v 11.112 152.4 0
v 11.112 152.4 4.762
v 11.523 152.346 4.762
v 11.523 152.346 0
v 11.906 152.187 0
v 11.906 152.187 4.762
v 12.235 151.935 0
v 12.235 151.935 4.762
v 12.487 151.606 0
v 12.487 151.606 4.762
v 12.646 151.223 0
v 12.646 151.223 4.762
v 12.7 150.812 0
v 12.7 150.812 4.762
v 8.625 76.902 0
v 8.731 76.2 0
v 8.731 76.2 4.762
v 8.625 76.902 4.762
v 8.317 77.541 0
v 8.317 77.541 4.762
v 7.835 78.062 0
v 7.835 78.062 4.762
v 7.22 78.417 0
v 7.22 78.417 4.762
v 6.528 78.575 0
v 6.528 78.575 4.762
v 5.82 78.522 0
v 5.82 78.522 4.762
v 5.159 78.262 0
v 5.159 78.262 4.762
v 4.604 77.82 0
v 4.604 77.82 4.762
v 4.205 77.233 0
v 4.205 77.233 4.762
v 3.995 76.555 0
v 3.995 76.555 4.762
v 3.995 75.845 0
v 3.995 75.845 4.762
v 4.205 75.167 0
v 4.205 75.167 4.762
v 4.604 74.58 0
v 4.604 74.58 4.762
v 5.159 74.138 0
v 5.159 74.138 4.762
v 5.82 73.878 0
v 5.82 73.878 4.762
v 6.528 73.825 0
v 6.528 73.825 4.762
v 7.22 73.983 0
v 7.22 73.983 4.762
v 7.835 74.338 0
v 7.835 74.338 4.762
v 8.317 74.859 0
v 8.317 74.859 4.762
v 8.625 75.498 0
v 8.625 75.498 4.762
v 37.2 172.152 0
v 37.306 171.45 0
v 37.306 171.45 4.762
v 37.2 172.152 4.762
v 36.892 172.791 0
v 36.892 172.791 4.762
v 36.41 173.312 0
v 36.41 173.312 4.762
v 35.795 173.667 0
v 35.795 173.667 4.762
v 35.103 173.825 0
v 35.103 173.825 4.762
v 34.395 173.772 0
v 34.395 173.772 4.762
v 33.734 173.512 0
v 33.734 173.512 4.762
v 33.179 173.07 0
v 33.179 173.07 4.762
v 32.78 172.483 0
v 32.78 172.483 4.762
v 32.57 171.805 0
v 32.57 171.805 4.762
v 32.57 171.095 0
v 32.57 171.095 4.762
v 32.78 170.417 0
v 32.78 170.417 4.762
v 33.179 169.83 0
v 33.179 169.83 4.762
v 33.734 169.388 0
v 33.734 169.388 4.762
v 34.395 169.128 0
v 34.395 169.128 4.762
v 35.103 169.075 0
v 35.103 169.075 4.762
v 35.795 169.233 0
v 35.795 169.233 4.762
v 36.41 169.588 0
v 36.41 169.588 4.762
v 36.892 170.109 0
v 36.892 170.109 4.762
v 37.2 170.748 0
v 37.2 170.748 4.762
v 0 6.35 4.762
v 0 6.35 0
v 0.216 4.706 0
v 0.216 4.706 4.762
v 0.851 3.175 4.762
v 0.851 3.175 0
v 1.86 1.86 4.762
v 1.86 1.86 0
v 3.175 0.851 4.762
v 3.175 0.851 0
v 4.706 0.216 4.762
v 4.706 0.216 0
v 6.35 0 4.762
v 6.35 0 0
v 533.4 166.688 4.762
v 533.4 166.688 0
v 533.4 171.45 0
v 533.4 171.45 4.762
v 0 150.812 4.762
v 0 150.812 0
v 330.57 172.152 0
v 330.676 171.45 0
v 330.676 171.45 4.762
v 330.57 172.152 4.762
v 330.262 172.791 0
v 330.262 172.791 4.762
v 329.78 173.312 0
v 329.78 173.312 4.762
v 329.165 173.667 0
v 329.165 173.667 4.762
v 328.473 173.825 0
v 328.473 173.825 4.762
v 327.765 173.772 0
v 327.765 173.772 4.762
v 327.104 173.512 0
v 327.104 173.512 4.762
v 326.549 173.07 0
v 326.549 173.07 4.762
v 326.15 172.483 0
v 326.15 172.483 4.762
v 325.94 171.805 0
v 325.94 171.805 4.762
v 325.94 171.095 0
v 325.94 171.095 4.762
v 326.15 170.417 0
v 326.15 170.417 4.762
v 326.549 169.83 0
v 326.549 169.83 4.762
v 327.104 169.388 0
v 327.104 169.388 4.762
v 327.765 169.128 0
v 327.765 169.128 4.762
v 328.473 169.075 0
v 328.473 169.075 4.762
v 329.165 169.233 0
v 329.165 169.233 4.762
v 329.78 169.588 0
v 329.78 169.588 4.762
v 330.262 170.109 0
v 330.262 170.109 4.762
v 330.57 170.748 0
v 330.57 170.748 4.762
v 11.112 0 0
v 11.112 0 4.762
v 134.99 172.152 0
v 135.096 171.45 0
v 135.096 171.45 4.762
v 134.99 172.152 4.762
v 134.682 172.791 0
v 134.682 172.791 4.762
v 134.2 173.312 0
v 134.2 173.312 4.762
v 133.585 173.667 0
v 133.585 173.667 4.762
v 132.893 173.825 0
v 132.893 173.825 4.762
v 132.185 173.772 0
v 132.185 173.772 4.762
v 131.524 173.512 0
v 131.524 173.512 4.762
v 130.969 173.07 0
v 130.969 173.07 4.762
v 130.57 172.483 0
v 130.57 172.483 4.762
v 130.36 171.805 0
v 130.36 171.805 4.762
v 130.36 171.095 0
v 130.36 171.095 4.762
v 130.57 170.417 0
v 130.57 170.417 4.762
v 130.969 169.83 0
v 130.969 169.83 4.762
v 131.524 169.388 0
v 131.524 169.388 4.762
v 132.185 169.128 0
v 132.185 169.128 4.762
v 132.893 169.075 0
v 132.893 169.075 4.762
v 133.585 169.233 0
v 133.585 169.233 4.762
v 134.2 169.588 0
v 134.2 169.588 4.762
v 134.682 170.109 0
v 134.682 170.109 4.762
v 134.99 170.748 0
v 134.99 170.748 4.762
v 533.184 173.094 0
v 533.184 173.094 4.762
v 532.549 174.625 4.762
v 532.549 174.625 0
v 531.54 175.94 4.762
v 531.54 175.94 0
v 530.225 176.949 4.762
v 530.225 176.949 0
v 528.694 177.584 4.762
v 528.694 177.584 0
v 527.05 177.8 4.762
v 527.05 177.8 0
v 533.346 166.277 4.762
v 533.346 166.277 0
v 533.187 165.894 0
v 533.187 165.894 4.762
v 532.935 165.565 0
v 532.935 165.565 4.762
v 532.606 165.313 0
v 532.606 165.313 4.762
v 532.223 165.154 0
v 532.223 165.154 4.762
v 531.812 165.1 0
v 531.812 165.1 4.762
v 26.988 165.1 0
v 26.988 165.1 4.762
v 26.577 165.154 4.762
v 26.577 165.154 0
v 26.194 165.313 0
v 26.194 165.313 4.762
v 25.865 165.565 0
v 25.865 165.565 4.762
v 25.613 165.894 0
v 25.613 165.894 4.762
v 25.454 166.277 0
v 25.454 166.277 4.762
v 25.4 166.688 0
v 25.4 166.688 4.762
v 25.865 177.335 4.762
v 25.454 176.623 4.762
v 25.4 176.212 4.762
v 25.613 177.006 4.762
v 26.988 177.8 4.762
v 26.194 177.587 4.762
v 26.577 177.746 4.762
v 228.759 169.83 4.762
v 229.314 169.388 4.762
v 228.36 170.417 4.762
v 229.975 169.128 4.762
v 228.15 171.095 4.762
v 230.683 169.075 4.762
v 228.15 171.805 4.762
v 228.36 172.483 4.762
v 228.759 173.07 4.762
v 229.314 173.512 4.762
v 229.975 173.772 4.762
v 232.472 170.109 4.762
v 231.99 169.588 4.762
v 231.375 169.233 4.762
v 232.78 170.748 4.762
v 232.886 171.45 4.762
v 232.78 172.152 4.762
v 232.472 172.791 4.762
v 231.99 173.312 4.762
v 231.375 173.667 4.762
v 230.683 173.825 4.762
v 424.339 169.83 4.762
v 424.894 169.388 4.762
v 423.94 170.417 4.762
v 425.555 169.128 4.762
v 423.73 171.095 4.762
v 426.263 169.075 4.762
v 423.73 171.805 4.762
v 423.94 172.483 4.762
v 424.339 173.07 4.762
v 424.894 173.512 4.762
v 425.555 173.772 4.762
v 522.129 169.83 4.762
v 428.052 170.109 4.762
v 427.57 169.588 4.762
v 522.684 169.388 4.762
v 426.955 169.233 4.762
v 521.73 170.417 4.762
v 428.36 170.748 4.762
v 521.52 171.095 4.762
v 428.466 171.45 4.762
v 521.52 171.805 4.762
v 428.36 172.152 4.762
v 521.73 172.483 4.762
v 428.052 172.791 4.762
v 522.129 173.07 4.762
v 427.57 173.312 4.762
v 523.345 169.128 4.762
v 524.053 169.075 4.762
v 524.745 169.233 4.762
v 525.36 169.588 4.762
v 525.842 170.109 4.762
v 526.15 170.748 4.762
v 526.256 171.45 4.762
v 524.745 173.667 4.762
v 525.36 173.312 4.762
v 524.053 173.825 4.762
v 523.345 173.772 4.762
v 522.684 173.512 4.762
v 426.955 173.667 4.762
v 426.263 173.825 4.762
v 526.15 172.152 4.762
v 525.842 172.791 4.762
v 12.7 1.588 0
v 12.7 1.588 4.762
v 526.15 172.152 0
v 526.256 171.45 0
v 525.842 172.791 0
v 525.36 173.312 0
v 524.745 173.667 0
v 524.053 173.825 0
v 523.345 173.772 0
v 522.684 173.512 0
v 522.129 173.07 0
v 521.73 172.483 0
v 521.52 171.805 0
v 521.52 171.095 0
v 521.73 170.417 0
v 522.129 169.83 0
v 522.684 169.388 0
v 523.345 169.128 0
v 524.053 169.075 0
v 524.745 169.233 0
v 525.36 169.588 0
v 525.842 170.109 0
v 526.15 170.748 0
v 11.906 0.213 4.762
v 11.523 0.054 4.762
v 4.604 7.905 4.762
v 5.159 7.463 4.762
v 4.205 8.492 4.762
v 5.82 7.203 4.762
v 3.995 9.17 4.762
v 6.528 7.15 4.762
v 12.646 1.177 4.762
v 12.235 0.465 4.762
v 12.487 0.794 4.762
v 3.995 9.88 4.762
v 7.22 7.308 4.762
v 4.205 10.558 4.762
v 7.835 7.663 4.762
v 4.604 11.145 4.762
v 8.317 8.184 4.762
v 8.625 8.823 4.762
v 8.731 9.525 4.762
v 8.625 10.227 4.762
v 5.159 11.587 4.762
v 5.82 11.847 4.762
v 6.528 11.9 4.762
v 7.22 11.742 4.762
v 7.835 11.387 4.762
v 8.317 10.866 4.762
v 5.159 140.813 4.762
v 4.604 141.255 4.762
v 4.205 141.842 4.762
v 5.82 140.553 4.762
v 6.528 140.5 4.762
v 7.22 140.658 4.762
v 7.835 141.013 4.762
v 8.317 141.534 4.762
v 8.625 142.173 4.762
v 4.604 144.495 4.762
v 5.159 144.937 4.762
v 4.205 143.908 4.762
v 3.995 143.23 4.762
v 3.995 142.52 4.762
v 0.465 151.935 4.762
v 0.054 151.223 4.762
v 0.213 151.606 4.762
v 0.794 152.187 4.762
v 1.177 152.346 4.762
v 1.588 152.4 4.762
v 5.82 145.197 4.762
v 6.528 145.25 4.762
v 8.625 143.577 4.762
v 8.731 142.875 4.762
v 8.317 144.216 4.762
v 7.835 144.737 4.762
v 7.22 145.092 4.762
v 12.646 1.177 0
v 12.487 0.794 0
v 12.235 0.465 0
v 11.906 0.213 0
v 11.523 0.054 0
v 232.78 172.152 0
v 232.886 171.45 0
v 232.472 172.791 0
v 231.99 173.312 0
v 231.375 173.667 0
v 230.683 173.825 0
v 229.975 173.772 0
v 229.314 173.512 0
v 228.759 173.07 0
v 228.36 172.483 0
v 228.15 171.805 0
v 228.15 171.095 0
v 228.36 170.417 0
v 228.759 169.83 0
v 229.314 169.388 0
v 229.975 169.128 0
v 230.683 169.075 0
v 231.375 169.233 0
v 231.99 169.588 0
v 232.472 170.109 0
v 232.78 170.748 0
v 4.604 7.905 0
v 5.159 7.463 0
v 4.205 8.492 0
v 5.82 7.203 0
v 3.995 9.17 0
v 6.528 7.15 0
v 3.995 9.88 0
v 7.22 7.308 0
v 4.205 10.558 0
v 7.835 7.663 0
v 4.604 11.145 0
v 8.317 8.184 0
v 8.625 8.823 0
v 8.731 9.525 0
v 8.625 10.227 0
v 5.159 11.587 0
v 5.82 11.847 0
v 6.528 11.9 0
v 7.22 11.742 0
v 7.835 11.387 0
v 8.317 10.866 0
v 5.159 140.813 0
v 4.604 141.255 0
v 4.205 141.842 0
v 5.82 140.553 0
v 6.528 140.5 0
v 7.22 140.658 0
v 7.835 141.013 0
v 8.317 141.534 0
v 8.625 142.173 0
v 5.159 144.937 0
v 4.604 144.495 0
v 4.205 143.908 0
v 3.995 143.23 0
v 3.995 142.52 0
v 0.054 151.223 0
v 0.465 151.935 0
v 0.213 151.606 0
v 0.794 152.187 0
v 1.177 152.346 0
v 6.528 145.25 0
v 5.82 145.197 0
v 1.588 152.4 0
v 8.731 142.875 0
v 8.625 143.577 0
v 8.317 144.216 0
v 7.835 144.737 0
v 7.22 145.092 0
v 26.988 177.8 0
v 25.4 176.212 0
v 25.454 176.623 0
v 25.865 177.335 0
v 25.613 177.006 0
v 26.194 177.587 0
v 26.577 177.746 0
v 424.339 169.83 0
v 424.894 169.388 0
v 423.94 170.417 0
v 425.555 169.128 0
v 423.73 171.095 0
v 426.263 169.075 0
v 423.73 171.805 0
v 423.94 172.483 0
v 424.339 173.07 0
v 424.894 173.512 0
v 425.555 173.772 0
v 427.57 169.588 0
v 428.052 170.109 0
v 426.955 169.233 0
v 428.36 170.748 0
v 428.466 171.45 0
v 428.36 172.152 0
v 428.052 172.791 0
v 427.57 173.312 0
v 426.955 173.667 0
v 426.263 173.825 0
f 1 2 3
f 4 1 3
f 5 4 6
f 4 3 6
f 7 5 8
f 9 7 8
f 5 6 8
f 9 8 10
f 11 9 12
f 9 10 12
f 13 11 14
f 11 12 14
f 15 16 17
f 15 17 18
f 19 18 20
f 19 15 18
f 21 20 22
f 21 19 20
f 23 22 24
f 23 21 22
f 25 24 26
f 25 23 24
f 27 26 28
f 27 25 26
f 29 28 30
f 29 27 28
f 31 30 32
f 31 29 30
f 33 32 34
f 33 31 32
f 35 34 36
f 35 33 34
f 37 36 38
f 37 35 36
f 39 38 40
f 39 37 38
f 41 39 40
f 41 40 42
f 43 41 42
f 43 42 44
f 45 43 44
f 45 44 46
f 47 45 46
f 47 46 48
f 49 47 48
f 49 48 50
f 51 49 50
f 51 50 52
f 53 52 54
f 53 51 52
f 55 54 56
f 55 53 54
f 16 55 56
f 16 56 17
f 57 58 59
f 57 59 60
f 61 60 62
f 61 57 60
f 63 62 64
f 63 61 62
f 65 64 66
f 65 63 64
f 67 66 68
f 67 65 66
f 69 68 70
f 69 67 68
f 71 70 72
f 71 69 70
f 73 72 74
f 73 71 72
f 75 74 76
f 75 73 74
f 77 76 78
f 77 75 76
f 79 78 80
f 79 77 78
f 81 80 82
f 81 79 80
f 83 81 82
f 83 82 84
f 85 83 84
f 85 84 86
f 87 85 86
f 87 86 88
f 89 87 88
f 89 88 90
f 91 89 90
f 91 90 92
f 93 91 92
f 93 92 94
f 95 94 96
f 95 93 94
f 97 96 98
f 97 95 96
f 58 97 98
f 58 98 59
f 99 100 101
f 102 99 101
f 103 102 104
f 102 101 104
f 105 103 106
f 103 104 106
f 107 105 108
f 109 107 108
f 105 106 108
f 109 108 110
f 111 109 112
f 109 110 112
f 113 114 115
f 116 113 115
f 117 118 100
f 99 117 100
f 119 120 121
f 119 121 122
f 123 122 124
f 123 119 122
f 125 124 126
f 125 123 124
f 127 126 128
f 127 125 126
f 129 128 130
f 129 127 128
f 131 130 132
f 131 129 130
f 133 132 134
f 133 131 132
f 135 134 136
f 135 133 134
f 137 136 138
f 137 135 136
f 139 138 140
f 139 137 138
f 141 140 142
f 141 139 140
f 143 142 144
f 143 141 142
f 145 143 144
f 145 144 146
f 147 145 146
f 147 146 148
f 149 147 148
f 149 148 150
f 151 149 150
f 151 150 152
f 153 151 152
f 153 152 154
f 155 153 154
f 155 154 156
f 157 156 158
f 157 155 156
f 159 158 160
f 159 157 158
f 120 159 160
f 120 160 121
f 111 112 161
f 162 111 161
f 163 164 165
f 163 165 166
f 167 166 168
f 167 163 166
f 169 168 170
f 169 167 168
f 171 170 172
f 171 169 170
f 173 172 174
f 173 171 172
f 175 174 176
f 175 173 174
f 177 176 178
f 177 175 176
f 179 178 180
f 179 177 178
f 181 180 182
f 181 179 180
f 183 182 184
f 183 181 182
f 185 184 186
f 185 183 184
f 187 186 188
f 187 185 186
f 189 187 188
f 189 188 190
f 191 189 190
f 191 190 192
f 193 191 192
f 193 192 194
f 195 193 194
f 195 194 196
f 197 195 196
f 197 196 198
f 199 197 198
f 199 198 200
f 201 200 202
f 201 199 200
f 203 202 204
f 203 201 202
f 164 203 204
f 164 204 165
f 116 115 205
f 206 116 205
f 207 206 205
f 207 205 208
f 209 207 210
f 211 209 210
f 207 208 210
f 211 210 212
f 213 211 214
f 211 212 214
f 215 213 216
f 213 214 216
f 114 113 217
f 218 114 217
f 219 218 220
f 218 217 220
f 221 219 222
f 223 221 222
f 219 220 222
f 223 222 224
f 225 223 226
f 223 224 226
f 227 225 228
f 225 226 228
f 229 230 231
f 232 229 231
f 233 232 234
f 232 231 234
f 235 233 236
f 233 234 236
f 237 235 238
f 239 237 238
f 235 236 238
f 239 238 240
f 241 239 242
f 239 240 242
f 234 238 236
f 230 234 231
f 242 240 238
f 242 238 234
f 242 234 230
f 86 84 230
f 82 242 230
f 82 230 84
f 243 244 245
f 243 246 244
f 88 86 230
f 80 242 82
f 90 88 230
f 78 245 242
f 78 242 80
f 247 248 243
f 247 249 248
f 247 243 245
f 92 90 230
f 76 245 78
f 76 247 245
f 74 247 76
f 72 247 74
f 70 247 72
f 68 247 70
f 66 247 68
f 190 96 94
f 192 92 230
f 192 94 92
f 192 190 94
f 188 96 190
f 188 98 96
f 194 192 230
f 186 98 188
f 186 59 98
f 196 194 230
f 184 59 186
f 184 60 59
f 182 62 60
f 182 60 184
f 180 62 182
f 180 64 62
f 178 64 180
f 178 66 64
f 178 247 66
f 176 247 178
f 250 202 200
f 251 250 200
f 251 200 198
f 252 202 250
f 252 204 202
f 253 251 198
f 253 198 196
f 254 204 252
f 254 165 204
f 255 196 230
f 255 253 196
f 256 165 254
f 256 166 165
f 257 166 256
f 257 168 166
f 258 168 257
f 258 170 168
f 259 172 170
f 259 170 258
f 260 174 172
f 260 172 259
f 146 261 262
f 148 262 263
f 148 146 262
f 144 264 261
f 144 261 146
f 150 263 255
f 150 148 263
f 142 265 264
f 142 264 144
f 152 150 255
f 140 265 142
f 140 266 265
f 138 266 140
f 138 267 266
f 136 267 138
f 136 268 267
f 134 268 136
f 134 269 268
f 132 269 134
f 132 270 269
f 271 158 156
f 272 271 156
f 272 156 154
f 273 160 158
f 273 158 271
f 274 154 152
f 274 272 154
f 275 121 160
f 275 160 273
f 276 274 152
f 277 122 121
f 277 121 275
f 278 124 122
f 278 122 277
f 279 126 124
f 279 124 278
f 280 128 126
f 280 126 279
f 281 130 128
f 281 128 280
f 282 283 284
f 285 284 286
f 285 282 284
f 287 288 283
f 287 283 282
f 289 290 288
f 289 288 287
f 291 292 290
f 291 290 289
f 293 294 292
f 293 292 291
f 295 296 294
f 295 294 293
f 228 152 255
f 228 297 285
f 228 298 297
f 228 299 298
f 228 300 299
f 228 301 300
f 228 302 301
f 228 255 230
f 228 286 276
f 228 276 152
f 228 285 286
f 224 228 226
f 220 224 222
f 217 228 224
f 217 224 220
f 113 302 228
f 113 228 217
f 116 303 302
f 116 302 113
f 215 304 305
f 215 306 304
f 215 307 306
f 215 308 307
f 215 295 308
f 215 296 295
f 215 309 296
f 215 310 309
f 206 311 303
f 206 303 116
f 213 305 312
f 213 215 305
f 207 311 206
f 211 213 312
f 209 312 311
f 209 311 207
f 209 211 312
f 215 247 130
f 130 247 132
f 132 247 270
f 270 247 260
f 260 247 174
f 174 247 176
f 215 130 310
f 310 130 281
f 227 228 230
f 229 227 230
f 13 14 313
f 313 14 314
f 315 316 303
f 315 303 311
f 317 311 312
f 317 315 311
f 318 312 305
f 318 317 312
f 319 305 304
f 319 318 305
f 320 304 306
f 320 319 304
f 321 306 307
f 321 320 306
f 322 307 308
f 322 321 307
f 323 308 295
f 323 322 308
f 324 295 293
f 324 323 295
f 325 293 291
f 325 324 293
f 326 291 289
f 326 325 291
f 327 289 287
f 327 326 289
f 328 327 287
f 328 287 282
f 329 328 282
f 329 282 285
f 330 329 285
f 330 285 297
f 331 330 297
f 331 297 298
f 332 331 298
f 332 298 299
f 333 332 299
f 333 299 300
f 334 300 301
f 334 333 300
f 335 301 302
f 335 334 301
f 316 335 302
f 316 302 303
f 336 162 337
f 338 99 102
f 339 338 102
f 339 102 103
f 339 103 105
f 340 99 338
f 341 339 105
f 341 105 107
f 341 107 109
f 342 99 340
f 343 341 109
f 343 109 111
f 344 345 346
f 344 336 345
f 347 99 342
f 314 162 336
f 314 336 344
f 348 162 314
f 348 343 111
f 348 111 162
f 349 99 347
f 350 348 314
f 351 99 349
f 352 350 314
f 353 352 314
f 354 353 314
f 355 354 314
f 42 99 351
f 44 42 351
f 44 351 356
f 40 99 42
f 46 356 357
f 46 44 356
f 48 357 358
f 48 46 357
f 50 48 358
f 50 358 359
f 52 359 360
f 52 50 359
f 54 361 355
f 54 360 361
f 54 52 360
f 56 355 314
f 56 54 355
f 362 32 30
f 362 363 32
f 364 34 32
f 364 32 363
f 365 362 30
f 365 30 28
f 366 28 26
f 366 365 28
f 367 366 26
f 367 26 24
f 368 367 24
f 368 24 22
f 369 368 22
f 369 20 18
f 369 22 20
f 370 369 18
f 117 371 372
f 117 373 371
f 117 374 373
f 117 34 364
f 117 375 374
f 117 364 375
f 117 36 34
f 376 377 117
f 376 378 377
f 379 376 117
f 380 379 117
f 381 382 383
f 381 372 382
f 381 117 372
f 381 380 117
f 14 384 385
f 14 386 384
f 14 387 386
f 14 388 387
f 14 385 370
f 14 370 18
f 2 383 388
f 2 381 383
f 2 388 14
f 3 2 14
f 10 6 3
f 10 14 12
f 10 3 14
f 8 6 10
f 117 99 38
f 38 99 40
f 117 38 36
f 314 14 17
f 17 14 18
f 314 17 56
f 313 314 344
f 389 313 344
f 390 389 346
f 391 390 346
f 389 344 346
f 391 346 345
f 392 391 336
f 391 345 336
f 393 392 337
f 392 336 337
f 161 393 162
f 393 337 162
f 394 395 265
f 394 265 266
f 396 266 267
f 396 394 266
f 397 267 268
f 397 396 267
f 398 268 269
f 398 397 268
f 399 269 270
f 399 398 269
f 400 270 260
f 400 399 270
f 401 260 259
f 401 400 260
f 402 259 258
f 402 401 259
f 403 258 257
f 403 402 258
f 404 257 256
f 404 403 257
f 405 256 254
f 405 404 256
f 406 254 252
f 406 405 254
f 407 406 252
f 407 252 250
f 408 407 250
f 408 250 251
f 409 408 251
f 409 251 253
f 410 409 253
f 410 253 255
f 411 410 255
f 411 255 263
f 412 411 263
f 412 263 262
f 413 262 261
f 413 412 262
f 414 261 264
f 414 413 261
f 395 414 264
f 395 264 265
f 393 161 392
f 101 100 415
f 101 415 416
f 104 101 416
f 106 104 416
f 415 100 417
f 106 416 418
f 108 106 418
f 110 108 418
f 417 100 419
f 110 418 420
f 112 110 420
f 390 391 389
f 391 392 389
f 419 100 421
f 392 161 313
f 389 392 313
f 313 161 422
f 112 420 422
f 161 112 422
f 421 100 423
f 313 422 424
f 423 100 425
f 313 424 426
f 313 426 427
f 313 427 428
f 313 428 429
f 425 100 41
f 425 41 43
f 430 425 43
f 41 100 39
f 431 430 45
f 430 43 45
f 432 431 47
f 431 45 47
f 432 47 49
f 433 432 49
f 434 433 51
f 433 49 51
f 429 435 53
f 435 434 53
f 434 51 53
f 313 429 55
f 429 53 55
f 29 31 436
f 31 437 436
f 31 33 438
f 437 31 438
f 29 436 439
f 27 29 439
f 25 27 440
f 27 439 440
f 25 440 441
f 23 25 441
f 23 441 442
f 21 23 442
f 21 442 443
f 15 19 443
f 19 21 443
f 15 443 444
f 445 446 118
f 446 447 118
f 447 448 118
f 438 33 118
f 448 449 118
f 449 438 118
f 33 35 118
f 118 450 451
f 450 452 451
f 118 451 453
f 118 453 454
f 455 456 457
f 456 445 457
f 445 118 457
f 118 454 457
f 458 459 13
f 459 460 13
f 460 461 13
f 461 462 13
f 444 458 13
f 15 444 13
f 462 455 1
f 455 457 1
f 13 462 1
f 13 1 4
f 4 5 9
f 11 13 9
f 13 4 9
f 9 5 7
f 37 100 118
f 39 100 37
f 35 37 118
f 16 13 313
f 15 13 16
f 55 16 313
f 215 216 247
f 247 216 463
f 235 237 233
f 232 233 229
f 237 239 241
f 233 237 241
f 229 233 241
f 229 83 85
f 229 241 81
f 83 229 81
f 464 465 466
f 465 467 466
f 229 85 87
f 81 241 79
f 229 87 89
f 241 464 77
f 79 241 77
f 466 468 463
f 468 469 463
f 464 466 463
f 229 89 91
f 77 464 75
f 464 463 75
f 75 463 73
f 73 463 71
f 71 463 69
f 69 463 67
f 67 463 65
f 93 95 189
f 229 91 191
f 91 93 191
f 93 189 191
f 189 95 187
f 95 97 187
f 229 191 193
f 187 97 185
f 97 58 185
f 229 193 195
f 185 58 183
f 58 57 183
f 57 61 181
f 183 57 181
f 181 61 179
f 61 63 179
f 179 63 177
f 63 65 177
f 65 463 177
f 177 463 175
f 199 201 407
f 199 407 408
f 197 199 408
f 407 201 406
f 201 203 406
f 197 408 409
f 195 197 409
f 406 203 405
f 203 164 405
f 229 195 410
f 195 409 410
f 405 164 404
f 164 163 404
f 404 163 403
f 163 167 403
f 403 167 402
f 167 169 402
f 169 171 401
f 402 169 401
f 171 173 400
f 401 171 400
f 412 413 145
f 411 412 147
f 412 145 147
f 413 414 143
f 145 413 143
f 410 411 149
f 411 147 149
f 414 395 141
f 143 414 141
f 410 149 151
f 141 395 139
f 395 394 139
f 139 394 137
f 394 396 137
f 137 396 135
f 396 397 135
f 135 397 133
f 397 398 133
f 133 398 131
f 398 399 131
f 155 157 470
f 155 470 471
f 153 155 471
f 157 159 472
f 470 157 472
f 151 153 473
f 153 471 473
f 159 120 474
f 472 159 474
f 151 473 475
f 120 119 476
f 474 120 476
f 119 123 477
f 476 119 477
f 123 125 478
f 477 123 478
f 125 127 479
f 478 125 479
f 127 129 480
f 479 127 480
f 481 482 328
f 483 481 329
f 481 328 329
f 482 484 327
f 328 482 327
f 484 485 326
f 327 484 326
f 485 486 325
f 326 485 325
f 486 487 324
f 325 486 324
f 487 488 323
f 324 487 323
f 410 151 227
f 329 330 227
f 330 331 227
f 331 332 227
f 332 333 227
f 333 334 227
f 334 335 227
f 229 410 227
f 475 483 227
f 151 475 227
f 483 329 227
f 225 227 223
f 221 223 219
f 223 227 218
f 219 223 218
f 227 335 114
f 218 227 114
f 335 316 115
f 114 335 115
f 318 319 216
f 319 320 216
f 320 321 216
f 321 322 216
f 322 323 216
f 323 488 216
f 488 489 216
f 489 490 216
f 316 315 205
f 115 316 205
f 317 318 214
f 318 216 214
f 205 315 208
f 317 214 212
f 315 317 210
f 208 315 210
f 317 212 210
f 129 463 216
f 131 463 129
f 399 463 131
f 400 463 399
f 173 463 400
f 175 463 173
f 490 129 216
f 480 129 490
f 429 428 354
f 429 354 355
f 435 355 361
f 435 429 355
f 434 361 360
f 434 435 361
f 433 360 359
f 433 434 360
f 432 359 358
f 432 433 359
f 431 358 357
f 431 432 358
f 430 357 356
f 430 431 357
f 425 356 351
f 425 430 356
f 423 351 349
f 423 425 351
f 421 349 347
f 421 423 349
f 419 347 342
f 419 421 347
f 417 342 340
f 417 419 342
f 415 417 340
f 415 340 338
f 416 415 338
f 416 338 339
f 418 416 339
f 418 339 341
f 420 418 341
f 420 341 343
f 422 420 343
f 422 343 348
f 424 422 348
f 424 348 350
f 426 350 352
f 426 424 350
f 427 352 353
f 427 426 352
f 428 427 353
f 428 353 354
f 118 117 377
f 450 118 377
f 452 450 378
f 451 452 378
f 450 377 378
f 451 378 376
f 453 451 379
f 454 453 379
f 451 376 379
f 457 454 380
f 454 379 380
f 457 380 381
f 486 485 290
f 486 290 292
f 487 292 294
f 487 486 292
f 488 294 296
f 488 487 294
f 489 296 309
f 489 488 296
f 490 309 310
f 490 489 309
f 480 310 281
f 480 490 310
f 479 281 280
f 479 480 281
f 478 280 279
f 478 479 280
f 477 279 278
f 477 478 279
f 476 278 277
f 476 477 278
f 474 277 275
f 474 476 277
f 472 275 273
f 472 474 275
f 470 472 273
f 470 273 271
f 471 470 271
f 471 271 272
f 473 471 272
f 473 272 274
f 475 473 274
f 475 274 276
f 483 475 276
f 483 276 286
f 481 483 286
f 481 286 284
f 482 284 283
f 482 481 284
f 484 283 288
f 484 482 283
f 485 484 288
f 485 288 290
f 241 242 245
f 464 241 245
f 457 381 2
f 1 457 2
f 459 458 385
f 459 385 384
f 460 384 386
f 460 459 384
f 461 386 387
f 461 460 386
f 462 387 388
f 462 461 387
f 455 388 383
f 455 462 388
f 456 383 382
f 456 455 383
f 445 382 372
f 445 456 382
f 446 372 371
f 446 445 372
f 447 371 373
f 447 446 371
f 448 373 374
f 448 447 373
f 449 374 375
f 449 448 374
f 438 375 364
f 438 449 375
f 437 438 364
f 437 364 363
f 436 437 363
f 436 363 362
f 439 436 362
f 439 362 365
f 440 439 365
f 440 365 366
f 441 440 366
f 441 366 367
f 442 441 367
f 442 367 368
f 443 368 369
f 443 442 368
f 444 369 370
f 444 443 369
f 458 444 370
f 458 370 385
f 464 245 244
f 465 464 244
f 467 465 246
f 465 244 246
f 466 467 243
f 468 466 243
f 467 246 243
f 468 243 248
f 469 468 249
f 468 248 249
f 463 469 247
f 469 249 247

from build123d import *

# Parameters (mm, degrees)
F0_R     = 2.38125
F1_DEPTH = 4.7625
F4_W     = 148.8558202982
F4_H     = 38.4750810385
F4_W_2   = 12.7
F4_H_2   = 12.7
F5_DEPTH = 4.7635
F7_DEPTH = 4.7625


# Not quite as in the source:
# - a feature of the source that left no trace in its solid (it failed there, or was rolled back) is left out


with BuildPart() as f1:
    # F0 (on Top) → F1 (new body)
    with BuildSketch(Plane.XY):
        with BuildLine():
            ThreePointArc((0, 6.35), (1.8598719395, 1.8598719395), (6.35, 0))
            Line((6.35, 0), (527.05, 0))
            ThreePointArc((527.05, 0), (531.5401280605, 1.8598719395), (533.4, 6.35))
            Line((533.4, 6.35), (533.4, 171.45))
            ThreePointArc((533.4, 171.45), (531.5401280605, 175.9401280605), (527.05, 177.8))
            Line((527.05, 177.8), (336.55, 177.8))
            ThreePointArc((336.55, 177.8), (332.0598719395, 179.6598719395), (330.2, 184.15))
            Line((330.2, 184.15), (330.2, 203.2))
            ThreePointArc((330.2, 203.2), (328.3401280605, 207.6901280605), (323.85, 209.55))
            Line((323.85, 209.55), (209.55, 209.55))
            ThreePointArc((209.55, 209.55), (205.0598719395, 207.6901280605), (203.2, 203.2))
            Line((203.2, 203.2), (203.2, 184.15))
            ThreePointArc((203.2, 184.15), (201.3401280605, 179.6598719395), (196.85, 177.8))
            Line((196.85, 177.8), (6.35, 177.8))
            ThreePointArc((6.35, 177.8), (1.8598719395, 175.9401280605), (0, 171.45))
            Line((0, 171.45), (0, 6.35))
        make_face()
        with Locations((6.35, 9.525)):
            Circle(F0_R, mode=Mode.SUBTRACT)
        with Locations((257.175, 30.1625)):
            Circle(F0_R, mode=Mode.SUBTRACT)
        with Locations((6.35, 76.2)):
            Circle(F0_R, mode=Mode.SUBTRACT)
        with Locations((257.175, 93.6625)):
            Circle(F0_R, mode=Mode.SUBTRACT)
        with Locations((485.775, 30.1625)):
            Circle(F0_R, mode=Mode.SUBTRACT)
        with Locations((485.775, 93.6625)):
            Circle(F0_R, mode=Mode.SUBTRACT)
        with Locations((6.35, 142.875)):
            Circle(F0_R, mode=Mode.SUBTRACT)
        with Locations((34.925, 171.45)):
            Circle(F0_R, mode=Mode.SUBTRACT)
        with Locations((132.715, 171.45)):
            Circle(F0_R, mode=Mode.SUBTRACT)
        with Locations((230.505, 171.45)):
            Circle(F0_R, mode=Mode.SUBTRACT)
        with Locations((223.8375, 195.2625)):
            Circle(F0_R, mode=Mode.SUBTRACT)
        with Locations((239.7125, 185.7375)):
            Circle(F0_R, mode=Mode.SUBTRACT)
        with Locations((328.295, 171.45)):
            Circle(F0_R, mode=Mode.SUBTRACT)
        with Locations((293.6875, 185.7375)):
            Circle(F0_R, mode=Mode.SUBTRACT)
        with Locations((309.5625, 195.2625)):
            Circle(F0_R, mode=Mode.SUBTRACT)
        with Locations((426.085, 171.45)):
            Circle(F0_R, mode=Mode.SUBTRACT)
        with Locations((523.875, 171.45)):
            Circle(F0_R, mode=Mode.SUBTRACT)
    extrude(amount=F1_DEPTH)

    # F4 (on face) → F5 (cut, through all)
    with BuildSketch(Plane.XY.offset(4.7625)):
        with Locations((269.9074968696, 197.0375405192)):
            Rectangle(F4_W, F4_H)
        Polygon((25.4, 185.5913083792), (-12.6593864247, 185.5913083792), (-12.6593864247, 152.4), (12.7, 152.4), (12.7, 165.1), (25.4, 165.1), align=None)
        Polygon((533.4, 165.1), (25.4, 165.1), (25.4, 152.4), (12.7, 152.4), (12.7, 0), (533.4, 0), align=None)
        with Locations((19.05, 158.75)):
            Rectangle(F4_W_2, F4_H_2)
    extrude(amount=-F5_DEPTH, mode=Mode.SUBTRACT)

    # F6 (on face) → F7 (cut, through all)
    with BuildSketch(Plane.XY.offset(4.7625)):
        with BuildLine():
            Line((12.7, 150.8125), (12.7, 152.4))
            Line((12.7, 152.4), (11.1125, 152.4))
            ThreePointArc((11.1125, 152.4), (12.2350320151, 151.9350320151), (12.7, 150.8125))
        make_face()
        with BuildLine():
            Line((1.5875, 152.4), (0, 152.4))
            Line((0, 152.4), (0, 150.8125))
            ThreePointArc((0, 150.8125), (0.4649679849, 151.9350320151), (1.5875, 152.4))
        make_face()
        with BuildLine():
            ThreePointArc((12.7, 1.5875), (12.2350320151, 0.4649679849), (11.1125, 0))
            Line((11.1125, 0), (12.7, 0))
            Line((12.7, 0), (12.7, 1.5875))
        make_face()
        with BuildLine():
            ThreePointArc((25.4, 176.2125), (25.8649679849, 177.3350320151), (26.9875, 177.8))
            Line((26.9875, 177.8), (25.4, 177.8))
            Line((25.4, 177.8), (25.4, 176.2125))
        make_face()
        with BuildLine():
            ThreePointArc((26.9875, 165.1), (25.8649679849, 165.5649679849), (25.4, 166.6875))
            Line((25.4, 166.6875), (25.4, 165.1))
            Line((25.4, 165.1), (26.9875, 165.1))
        make_face()
        with BuildLine():
            ThreePointArc((533.4, 166.6875), (532.9350320151, 165.5649679849), (531.8125, 165.1))
            Line((531.8125, 165.1), (533.4, 165.1))
            Line((533.4, 165.1), (533.4, 166.6875))
        make_face()
    extrude(amount=-F7_DEPTH, mode=Mode.SUBTRACT)


solid = f1.part
